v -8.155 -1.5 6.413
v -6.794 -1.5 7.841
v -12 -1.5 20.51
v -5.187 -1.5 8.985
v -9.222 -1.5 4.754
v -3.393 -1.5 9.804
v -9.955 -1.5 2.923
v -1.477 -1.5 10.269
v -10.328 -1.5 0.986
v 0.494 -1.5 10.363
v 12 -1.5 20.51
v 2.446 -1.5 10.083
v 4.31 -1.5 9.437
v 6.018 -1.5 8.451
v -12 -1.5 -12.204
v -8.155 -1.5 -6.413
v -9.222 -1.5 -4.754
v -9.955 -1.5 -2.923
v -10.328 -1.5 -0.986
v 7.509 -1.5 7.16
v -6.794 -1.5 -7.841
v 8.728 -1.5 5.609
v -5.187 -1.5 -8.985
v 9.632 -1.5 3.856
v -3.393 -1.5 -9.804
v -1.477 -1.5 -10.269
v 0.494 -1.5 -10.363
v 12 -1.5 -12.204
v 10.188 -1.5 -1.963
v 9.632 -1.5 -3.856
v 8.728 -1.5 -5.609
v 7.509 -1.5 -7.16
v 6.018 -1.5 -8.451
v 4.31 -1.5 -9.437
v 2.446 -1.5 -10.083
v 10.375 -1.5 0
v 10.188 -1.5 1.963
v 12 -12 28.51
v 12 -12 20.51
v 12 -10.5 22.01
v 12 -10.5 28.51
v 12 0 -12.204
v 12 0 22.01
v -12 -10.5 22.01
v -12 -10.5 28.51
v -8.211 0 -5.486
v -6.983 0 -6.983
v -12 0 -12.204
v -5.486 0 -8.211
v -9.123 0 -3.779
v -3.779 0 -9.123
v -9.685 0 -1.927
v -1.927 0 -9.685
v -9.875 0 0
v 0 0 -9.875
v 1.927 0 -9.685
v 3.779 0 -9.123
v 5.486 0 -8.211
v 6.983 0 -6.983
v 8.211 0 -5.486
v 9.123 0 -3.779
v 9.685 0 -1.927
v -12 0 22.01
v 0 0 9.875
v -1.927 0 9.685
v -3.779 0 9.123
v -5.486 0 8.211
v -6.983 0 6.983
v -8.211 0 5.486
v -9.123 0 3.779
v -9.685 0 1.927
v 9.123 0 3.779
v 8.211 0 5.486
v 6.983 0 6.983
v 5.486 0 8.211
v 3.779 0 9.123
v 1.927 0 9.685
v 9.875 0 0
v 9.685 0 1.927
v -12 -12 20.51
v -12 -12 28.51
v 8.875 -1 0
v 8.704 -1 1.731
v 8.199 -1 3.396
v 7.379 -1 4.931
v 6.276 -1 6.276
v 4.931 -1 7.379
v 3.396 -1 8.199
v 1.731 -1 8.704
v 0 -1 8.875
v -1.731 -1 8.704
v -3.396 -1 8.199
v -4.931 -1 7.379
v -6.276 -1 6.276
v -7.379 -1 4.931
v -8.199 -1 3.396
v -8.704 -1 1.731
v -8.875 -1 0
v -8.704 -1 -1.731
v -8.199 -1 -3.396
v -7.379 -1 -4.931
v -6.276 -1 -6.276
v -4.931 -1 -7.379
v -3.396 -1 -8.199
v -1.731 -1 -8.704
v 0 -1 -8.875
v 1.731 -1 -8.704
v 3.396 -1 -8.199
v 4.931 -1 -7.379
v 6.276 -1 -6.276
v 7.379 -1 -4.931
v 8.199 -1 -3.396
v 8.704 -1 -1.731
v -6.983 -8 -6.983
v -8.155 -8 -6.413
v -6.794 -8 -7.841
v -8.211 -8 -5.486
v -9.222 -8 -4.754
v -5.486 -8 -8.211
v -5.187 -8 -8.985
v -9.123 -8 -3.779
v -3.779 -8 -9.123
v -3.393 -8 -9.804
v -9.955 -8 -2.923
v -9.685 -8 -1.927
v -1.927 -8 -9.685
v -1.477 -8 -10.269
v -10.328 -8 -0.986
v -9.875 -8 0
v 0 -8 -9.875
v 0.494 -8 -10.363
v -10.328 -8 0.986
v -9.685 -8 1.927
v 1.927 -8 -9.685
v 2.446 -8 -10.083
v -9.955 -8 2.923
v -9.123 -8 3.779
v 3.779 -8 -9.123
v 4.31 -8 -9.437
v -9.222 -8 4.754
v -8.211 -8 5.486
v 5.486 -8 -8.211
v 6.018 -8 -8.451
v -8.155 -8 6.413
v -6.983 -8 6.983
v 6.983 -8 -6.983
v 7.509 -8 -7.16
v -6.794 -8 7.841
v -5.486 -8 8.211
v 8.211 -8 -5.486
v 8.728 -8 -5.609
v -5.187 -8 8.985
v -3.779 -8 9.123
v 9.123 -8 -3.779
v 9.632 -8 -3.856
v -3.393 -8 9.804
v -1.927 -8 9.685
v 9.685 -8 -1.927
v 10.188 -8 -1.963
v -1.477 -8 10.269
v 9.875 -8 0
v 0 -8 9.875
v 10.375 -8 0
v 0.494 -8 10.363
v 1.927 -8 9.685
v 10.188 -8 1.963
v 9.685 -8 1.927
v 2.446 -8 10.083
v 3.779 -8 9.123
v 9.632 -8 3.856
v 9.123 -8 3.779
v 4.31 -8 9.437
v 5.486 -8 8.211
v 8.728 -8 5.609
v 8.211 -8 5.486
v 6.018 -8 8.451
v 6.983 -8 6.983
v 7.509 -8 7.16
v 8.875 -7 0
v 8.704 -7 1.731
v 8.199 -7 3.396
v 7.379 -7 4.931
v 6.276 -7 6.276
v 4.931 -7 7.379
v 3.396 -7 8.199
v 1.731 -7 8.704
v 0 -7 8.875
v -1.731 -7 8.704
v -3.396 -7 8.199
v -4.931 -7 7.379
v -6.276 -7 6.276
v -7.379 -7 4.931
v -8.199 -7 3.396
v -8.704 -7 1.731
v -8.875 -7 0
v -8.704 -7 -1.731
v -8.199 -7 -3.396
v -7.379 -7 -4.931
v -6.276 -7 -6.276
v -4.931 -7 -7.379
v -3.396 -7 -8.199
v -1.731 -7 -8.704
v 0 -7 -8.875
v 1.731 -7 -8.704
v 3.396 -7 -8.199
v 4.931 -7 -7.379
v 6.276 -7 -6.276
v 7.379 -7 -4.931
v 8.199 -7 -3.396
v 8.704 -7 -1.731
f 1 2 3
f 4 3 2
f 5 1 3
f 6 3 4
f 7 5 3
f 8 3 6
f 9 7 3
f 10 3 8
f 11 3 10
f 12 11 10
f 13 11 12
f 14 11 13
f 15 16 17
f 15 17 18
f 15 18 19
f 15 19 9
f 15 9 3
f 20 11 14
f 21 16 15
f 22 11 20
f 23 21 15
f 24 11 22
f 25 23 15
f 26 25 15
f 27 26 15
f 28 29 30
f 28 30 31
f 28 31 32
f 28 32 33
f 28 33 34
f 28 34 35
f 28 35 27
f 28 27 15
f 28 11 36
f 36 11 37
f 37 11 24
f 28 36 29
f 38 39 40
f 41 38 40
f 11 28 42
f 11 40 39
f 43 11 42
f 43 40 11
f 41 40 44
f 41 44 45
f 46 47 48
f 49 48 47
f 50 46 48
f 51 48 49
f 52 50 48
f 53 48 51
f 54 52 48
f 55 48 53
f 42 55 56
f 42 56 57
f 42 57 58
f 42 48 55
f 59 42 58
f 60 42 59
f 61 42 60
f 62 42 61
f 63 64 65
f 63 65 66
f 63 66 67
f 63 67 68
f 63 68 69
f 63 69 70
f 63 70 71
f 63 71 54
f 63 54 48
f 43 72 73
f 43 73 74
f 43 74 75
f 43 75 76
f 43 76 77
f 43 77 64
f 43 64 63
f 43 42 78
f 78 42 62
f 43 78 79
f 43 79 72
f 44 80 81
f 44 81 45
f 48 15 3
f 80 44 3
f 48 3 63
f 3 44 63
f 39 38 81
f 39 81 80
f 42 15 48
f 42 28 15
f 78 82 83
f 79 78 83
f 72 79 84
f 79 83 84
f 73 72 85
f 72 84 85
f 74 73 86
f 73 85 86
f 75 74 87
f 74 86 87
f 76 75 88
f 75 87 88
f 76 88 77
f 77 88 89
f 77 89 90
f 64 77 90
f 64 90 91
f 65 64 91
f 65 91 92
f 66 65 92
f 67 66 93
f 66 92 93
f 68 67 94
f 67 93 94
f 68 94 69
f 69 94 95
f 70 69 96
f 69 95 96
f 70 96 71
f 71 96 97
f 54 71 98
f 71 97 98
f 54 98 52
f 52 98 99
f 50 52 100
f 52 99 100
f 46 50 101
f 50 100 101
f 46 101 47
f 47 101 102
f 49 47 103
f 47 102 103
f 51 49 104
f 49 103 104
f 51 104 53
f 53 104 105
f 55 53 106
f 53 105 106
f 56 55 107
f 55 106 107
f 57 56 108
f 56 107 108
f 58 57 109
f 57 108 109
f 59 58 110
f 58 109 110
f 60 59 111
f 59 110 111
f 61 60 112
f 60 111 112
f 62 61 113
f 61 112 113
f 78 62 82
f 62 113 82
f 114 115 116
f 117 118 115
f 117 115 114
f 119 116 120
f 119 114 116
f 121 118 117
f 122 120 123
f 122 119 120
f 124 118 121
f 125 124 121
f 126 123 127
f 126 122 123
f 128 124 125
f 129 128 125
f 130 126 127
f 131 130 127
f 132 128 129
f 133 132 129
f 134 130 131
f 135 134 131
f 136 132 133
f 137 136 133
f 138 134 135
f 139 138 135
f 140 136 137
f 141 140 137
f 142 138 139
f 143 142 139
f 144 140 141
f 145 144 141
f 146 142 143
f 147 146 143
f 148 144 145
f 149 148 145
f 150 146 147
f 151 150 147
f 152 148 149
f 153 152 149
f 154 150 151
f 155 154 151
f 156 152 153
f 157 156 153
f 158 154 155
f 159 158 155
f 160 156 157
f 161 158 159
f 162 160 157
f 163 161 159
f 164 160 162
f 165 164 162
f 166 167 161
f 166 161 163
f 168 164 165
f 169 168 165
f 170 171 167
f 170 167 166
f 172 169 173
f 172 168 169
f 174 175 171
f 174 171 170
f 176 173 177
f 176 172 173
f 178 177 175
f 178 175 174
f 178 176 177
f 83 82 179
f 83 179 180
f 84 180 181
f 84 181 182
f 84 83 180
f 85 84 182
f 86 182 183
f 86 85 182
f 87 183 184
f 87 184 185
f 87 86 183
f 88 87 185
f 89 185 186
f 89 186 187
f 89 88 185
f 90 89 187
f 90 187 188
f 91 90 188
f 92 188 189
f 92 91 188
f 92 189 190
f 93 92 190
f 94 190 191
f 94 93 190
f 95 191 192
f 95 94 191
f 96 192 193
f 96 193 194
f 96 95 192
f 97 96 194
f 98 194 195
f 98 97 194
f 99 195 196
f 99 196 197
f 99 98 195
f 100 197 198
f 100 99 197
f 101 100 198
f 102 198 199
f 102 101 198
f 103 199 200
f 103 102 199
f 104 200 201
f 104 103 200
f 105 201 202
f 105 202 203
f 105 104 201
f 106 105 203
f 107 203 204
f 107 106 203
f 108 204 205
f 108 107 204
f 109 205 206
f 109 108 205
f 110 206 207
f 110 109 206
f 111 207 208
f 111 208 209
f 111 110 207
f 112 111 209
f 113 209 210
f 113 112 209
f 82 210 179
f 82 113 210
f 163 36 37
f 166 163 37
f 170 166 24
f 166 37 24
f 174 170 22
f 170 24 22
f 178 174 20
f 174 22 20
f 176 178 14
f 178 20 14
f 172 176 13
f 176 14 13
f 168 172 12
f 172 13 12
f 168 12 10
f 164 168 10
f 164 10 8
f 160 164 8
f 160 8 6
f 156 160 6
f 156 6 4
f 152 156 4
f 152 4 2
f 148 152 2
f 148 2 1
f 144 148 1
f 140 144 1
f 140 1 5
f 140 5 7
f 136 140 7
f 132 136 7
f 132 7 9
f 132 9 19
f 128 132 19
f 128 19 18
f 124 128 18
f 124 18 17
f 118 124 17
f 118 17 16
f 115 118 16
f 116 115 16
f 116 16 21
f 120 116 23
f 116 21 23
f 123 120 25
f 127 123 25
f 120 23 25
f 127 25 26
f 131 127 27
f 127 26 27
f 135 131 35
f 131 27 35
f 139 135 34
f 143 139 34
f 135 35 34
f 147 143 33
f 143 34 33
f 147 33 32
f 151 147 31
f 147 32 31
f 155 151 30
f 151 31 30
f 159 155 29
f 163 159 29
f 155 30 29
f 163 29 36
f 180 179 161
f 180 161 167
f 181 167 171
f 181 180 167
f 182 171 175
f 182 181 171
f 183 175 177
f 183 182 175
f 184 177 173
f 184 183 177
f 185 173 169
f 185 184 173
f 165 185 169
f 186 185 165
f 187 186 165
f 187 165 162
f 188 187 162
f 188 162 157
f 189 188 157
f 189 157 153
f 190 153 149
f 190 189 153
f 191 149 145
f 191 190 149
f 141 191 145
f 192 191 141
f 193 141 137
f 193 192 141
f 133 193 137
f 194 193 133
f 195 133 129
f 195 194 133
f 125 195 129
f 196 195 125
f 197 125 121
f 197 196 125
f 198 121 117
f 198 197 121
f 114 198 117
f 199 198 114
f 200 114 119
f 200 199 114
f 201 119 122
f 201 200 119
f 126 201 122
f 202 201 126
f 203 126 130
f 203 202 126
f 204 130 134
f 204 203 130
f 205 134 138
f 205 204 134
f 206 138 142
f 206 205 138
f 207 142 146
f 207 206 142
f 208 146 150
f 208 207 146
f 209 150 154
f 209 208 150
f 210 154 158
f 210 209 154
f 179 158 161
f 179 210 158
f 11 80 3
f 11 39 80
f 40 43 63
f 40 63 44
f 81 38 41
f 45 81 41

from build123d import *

# Parameters (mm, degrees)
F1_W          = 1.5
F1_H          = 6.5
F1_H_2        = 1.5
F2_DEPTH      = 12
F2_DEPTH_BACK = 12
F0_R          = 8.875
F3_DEPTH      = 25
F0_R_2        = 10.375
F4_DEPTH      = 8
F5_SIZE       = 1


with BuildPart() as f2:
    # F1 (on Right) → F2 (new body, two sides)
    with BuildSketch(Plane.YZ) as f2_sk:
        Polygon((-1.5, -12.204361), (0, -12.204361), (0, 20.509552), (0, 22.009552), (-1.5, 22.009552), (-10.5, 22.009552), (-10.5, 20.509552), (-1.5, 20.509552), align=None)
        with Locations((-11.25, 25.259552)):
            Rectangle(F1_W, F1_H)
        with Locations((-11.25, 21.259552)):
            Rectangle(F1_W, F1_H_2)
    extrude(amount=F2_DEPTH)
    extrude(f2_sk.sketch, amount=-F2_DEPTH_BACK)

    # F0 (on Front) → F3 (cut)
    with BuildSketch(Plane.XZ):
        Circle(F0_R)
    extrude(amount=F3_DEPTH, mode=Mode.SUBTRACT)

    # F0 (on Front) → F4 (join)
    with BuildSketch(Plane.XZ):
        Circle(F0_R_2)
        Circle(F0_R, mode=Mode.SUBTRACT)
    extrude(amount=F4_DEPTH)

    # F5
    f5_edges = [f2.edges().sort_by_distance(p)[0] for p in [
        (-8.875, -8, 0),
        (-8.875, 0, 0),
    ]]
    chamfer(f5_edges, length=F5_SIZE)


solid = f2.part
